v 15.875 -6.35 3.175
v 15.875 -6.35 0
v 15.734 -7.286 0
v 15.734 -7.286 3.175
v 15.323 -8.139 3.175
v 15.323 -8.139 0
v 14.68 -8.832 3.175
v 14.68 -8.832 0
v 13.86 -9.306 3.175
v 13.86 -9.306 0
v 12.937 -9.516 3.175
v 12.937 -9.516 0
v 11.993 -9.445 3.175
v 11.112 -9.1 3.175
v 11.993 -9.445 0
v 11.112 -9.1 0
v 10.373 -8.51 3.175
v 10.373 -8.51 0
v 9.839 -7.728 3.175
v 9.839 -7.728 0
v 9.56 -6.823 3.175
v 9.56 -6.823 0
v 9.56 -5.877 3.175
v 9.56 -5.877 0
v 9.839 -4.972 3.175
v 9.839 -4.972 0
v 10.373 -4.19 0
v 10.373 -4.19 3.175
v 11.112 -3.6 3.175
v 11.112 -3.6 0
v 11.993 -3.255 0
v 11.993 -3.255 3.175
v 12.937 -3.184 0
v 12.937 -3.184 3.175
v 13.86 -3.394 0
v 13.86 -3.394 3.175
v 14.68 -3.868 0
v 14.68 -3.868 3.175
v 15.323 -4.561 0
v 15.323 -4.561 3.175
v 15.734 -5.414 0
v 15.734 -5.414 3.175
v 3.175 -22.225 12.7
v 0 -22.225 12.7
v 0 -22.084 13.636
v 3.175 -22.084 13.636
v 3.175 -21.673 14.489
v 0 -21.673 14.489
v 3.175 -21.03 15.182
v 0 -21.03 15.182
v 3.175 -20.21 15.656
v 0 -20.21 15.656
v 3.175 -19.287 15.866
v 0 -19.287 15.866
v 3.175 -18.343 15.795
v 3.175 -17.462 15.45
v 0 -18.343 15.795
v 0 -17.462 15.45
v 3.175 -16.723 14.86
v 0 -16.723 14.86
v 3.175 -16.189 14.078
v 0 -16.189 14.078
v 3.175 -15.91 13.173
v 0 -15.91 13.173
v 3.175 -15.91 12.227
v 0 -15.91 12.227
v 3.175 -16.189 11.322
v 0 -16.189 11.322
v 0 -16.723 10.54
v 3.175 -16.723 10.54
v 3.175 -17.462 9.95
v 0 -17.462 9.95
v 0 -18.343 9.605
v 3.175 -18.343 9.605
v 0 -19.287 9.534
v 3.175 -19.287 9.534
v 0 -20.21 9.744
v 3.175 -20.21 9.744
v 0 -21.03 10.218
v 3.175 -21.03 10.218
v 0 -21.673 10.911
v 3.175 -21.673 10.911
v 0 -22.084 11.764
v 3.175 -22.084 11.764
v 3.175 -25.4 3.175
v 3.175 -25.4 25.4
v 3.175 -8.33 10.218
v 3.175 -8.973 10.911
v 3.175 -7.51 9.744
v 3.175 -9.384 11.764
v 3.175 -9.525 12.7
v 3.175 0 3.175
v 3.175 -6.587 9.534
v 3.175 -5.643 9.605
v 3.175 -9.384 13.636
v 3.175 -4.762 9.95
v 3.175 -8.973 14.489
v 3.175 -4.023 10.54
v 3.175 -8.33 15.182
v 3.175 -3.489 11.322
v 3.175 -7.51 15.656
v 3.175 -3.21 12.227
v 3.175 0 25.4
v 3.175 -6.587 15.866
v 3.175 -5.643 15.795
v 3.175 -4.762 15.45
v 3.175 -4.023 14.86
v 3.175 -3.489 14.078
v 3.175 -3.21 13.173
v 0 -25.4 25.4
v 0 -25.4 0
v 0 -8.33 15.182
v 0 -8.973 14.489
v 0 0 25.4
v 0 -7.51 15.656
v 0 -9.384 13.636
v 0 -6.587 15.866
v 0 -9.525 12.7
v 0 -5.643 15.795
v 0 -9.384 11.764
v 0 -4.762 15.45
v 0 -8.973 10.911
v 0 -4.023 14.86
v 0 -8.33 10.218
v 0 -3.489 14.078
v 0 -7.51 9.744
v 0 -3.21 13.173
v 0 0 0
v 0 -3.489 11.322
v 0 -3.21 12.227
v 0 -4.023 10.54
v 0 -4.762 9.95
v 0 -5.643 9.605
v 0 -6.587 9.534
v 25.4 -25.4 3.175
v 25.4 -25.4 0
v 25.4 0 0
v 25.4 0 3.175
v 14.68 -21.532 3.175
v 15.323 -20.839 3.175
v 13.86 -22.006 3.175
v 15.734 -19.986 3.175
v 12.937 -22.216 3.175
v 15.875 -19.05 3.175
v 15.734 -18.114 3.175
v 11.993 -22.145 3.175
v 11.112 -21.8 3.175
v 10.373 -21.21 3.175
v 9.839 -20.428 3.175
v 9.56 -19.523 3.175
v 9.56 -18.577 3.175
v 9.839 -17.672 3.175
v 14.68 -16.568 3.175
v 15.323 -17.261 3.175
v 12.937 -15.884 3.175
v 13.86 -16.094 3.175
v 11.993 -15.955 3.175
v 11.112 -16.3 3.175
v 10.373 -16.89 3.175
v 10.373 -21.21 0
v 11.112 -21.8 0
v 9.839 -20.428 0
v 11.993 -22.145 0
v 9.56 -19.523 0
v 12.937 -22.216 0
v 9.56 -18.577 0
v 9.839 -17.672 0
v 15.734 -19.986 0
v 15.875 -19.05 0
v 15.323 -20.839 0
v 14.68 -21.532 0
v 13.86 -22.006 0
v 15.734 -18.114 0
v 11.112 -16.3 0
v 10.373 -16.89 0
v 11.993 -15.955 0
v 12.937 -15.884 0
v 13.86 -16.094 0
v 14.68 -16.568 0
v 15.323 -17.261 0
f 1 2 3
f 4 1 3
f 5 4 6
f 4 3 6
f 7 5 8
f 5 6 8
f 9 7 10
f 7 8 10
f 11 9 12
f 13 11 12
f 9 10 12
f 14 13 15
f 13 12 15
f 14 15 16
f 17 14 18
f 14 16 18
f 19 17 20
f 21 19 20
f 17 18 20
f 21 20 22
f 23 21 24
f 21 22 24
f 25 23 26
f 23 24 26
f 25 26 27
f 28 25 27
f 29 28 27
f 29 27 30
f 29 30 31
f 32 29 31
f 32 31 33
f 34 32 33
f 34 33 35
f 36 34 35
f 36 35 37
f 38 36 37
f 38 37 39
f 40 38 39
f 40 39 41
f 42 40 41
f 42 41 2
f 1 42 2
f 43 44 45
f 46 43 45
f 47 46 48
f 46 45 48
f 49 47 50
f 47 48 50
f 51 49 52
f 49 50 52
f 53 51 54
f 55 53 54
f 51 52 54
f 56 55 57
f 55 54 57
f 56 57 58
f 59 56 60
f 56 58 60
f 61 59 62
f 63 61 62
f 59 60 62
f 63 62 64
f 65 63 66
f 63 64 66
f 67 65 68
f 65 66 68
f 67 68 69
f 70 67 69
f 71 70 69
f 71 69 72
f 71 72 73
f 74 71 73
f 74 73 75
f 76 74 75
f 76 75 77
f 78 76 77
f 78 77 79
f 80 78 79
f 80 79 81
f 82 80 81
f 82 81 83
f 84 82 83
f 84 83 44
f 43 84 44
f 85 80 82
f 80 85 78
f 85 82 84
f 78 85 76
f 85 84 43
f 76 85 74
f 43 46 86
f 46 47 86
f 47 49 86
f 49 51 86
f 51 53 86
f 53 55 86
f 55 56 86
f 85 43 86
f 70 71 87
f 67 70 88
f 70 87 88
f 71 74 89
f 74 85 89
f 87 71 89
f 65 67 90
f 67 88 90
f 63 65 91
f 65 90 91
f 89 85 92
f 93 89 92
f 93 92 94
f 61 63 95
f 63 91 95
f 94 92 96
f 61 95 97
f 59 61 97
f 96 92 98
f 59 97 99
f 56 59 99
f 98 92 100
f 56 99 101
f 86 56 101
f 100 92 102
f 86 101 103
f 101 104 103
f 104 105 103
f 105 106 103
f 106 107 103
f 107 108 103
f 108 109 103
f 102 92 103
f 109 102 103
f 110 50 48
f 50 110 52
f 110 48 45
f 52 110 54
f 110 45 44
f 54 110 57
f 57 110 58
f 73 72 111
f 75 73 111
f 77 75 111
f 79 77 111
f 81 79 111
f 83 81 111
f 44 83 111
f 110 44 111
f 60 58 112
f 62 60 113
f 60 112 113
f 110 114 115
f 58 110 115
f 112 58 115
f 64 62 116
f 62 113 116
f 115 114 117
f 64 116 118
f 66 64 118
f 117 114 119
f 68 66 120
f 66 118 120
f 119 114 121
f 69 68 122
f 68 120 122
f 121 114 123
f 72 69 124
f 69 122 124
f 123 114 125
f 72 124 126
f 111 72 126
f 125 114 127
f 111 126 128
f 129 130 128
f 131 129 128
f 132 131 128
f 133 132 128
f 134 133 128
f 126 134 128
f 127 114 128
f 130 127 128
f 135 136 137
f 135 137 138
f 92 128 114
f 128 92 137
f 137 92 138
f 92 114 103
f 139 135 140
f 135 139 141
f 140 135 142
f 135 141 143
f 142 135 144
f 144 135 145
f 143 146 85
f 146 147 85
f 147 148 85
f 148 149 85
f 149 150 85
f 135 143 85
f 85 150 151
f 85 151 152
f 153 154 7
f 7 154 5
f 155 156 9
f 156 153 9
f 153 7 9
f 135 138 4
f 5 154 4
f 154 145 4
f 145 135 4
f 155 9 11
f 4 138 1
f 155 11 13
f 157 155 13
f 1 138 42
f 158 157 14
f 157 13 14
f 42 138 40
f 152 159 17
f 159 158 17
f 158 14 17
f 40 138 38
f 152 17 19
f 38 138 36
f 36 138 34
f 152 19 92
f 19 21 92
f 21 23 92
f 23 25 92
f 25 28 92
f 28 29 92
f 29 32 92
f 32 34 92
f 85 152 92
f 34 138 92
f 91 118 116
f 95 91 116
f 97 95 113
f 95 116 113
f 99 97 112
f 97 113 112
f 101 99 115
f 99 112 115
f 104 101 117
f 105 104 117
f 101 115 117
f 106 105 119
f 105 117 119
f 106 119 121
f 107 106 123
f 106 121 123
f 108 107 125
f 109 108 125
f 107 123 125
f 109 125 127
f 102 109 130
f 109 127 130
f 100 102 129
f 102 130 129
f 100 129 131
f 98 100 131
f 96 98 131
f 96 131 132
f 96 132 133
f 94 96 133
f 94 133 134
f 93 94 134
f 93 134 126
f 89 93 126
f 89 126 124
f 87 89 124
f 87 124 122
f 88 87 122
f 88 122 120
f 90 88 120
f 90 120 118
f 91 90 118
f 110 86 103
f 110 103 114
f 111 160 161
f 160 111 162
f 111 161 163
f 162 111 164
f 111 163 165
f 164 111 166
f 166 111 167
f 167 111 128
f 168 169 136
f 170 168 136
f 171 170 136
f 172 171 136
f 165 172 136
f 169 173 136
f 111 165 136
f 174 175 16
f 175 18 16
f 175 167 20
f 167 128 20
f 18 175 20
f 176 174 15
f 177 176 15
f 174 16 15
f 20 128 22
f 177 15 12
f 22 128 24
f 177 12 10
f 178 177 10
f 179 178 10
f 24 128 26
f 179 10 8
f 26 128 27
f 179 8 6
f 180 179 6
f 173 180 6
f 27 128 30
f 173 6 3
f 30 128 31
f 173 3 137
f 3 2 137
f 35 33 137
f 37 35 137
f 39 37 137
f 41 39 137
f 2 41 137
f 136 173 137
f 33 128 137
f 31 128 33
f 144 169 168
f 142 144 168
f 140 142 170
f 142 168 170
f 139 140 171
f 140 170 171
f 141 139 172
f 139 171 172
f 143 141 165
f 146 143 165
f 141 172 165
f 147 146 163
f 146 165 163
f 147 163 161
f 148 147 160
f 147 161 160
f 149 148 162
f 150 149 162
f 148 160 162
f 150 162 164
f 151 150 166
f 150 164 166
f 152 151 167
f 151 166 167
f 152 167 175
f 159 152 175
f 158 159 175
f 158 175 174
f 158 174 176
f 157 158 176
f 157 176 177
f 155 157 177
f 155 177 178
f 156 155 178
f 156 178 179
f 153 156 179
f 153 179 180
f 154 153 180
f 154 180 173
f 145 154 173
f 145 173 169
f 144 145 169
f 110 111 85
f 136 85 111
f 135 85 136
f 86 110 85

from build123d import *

# Parameters (mm, degrees)
F1_DEPTH = 25.4
F2_R     = 3.175
F3_DEPTH = 25.4
F4_R     = 3.175
F5_DEPTH = 25.4


with BuildPart() as f1:
    # F0 (on Front) → F1 (new body)
    with BuildSketch(Plane.XZ):
        Polygon((0, 25.4), (0, 0), (25.4, 0), (25.4, 3.175), (3.175, 3.175), (3.175, 25.4), align=None)
    extrude(amount=F1_DEPTH)

    # F2 (on face) → F3 (cut)
    with BuildSketch(Plane(origin=(0, 0, 0), x_dir=(0, -1, 0), z_dir=(-1, 0, 0))):
        with Locations((6.35, 12.7)):
            Circle(F2_R)
        with Locations((19.05, 12.7)):
            Circle(F2_R)
    extrude(amount=-F3_DEPTH, mode=Mode.SUBTRACT)

    # F4 (on face) → F5 (cut)
    with BuildSketch(Plane(origin=(0, 0, 0), x_dir=(1, 0, 0), z_dir=(0, 0, -1))):
        with Locations((12.7, 19.05)):
            Circle(F4_R)
        with Locations((12.7, 6.35)):
            Circle(F4_R)
    extrude(amount=-F5_DEPTH, mode=Mode.SUBTRACT)


solid = f1.part
